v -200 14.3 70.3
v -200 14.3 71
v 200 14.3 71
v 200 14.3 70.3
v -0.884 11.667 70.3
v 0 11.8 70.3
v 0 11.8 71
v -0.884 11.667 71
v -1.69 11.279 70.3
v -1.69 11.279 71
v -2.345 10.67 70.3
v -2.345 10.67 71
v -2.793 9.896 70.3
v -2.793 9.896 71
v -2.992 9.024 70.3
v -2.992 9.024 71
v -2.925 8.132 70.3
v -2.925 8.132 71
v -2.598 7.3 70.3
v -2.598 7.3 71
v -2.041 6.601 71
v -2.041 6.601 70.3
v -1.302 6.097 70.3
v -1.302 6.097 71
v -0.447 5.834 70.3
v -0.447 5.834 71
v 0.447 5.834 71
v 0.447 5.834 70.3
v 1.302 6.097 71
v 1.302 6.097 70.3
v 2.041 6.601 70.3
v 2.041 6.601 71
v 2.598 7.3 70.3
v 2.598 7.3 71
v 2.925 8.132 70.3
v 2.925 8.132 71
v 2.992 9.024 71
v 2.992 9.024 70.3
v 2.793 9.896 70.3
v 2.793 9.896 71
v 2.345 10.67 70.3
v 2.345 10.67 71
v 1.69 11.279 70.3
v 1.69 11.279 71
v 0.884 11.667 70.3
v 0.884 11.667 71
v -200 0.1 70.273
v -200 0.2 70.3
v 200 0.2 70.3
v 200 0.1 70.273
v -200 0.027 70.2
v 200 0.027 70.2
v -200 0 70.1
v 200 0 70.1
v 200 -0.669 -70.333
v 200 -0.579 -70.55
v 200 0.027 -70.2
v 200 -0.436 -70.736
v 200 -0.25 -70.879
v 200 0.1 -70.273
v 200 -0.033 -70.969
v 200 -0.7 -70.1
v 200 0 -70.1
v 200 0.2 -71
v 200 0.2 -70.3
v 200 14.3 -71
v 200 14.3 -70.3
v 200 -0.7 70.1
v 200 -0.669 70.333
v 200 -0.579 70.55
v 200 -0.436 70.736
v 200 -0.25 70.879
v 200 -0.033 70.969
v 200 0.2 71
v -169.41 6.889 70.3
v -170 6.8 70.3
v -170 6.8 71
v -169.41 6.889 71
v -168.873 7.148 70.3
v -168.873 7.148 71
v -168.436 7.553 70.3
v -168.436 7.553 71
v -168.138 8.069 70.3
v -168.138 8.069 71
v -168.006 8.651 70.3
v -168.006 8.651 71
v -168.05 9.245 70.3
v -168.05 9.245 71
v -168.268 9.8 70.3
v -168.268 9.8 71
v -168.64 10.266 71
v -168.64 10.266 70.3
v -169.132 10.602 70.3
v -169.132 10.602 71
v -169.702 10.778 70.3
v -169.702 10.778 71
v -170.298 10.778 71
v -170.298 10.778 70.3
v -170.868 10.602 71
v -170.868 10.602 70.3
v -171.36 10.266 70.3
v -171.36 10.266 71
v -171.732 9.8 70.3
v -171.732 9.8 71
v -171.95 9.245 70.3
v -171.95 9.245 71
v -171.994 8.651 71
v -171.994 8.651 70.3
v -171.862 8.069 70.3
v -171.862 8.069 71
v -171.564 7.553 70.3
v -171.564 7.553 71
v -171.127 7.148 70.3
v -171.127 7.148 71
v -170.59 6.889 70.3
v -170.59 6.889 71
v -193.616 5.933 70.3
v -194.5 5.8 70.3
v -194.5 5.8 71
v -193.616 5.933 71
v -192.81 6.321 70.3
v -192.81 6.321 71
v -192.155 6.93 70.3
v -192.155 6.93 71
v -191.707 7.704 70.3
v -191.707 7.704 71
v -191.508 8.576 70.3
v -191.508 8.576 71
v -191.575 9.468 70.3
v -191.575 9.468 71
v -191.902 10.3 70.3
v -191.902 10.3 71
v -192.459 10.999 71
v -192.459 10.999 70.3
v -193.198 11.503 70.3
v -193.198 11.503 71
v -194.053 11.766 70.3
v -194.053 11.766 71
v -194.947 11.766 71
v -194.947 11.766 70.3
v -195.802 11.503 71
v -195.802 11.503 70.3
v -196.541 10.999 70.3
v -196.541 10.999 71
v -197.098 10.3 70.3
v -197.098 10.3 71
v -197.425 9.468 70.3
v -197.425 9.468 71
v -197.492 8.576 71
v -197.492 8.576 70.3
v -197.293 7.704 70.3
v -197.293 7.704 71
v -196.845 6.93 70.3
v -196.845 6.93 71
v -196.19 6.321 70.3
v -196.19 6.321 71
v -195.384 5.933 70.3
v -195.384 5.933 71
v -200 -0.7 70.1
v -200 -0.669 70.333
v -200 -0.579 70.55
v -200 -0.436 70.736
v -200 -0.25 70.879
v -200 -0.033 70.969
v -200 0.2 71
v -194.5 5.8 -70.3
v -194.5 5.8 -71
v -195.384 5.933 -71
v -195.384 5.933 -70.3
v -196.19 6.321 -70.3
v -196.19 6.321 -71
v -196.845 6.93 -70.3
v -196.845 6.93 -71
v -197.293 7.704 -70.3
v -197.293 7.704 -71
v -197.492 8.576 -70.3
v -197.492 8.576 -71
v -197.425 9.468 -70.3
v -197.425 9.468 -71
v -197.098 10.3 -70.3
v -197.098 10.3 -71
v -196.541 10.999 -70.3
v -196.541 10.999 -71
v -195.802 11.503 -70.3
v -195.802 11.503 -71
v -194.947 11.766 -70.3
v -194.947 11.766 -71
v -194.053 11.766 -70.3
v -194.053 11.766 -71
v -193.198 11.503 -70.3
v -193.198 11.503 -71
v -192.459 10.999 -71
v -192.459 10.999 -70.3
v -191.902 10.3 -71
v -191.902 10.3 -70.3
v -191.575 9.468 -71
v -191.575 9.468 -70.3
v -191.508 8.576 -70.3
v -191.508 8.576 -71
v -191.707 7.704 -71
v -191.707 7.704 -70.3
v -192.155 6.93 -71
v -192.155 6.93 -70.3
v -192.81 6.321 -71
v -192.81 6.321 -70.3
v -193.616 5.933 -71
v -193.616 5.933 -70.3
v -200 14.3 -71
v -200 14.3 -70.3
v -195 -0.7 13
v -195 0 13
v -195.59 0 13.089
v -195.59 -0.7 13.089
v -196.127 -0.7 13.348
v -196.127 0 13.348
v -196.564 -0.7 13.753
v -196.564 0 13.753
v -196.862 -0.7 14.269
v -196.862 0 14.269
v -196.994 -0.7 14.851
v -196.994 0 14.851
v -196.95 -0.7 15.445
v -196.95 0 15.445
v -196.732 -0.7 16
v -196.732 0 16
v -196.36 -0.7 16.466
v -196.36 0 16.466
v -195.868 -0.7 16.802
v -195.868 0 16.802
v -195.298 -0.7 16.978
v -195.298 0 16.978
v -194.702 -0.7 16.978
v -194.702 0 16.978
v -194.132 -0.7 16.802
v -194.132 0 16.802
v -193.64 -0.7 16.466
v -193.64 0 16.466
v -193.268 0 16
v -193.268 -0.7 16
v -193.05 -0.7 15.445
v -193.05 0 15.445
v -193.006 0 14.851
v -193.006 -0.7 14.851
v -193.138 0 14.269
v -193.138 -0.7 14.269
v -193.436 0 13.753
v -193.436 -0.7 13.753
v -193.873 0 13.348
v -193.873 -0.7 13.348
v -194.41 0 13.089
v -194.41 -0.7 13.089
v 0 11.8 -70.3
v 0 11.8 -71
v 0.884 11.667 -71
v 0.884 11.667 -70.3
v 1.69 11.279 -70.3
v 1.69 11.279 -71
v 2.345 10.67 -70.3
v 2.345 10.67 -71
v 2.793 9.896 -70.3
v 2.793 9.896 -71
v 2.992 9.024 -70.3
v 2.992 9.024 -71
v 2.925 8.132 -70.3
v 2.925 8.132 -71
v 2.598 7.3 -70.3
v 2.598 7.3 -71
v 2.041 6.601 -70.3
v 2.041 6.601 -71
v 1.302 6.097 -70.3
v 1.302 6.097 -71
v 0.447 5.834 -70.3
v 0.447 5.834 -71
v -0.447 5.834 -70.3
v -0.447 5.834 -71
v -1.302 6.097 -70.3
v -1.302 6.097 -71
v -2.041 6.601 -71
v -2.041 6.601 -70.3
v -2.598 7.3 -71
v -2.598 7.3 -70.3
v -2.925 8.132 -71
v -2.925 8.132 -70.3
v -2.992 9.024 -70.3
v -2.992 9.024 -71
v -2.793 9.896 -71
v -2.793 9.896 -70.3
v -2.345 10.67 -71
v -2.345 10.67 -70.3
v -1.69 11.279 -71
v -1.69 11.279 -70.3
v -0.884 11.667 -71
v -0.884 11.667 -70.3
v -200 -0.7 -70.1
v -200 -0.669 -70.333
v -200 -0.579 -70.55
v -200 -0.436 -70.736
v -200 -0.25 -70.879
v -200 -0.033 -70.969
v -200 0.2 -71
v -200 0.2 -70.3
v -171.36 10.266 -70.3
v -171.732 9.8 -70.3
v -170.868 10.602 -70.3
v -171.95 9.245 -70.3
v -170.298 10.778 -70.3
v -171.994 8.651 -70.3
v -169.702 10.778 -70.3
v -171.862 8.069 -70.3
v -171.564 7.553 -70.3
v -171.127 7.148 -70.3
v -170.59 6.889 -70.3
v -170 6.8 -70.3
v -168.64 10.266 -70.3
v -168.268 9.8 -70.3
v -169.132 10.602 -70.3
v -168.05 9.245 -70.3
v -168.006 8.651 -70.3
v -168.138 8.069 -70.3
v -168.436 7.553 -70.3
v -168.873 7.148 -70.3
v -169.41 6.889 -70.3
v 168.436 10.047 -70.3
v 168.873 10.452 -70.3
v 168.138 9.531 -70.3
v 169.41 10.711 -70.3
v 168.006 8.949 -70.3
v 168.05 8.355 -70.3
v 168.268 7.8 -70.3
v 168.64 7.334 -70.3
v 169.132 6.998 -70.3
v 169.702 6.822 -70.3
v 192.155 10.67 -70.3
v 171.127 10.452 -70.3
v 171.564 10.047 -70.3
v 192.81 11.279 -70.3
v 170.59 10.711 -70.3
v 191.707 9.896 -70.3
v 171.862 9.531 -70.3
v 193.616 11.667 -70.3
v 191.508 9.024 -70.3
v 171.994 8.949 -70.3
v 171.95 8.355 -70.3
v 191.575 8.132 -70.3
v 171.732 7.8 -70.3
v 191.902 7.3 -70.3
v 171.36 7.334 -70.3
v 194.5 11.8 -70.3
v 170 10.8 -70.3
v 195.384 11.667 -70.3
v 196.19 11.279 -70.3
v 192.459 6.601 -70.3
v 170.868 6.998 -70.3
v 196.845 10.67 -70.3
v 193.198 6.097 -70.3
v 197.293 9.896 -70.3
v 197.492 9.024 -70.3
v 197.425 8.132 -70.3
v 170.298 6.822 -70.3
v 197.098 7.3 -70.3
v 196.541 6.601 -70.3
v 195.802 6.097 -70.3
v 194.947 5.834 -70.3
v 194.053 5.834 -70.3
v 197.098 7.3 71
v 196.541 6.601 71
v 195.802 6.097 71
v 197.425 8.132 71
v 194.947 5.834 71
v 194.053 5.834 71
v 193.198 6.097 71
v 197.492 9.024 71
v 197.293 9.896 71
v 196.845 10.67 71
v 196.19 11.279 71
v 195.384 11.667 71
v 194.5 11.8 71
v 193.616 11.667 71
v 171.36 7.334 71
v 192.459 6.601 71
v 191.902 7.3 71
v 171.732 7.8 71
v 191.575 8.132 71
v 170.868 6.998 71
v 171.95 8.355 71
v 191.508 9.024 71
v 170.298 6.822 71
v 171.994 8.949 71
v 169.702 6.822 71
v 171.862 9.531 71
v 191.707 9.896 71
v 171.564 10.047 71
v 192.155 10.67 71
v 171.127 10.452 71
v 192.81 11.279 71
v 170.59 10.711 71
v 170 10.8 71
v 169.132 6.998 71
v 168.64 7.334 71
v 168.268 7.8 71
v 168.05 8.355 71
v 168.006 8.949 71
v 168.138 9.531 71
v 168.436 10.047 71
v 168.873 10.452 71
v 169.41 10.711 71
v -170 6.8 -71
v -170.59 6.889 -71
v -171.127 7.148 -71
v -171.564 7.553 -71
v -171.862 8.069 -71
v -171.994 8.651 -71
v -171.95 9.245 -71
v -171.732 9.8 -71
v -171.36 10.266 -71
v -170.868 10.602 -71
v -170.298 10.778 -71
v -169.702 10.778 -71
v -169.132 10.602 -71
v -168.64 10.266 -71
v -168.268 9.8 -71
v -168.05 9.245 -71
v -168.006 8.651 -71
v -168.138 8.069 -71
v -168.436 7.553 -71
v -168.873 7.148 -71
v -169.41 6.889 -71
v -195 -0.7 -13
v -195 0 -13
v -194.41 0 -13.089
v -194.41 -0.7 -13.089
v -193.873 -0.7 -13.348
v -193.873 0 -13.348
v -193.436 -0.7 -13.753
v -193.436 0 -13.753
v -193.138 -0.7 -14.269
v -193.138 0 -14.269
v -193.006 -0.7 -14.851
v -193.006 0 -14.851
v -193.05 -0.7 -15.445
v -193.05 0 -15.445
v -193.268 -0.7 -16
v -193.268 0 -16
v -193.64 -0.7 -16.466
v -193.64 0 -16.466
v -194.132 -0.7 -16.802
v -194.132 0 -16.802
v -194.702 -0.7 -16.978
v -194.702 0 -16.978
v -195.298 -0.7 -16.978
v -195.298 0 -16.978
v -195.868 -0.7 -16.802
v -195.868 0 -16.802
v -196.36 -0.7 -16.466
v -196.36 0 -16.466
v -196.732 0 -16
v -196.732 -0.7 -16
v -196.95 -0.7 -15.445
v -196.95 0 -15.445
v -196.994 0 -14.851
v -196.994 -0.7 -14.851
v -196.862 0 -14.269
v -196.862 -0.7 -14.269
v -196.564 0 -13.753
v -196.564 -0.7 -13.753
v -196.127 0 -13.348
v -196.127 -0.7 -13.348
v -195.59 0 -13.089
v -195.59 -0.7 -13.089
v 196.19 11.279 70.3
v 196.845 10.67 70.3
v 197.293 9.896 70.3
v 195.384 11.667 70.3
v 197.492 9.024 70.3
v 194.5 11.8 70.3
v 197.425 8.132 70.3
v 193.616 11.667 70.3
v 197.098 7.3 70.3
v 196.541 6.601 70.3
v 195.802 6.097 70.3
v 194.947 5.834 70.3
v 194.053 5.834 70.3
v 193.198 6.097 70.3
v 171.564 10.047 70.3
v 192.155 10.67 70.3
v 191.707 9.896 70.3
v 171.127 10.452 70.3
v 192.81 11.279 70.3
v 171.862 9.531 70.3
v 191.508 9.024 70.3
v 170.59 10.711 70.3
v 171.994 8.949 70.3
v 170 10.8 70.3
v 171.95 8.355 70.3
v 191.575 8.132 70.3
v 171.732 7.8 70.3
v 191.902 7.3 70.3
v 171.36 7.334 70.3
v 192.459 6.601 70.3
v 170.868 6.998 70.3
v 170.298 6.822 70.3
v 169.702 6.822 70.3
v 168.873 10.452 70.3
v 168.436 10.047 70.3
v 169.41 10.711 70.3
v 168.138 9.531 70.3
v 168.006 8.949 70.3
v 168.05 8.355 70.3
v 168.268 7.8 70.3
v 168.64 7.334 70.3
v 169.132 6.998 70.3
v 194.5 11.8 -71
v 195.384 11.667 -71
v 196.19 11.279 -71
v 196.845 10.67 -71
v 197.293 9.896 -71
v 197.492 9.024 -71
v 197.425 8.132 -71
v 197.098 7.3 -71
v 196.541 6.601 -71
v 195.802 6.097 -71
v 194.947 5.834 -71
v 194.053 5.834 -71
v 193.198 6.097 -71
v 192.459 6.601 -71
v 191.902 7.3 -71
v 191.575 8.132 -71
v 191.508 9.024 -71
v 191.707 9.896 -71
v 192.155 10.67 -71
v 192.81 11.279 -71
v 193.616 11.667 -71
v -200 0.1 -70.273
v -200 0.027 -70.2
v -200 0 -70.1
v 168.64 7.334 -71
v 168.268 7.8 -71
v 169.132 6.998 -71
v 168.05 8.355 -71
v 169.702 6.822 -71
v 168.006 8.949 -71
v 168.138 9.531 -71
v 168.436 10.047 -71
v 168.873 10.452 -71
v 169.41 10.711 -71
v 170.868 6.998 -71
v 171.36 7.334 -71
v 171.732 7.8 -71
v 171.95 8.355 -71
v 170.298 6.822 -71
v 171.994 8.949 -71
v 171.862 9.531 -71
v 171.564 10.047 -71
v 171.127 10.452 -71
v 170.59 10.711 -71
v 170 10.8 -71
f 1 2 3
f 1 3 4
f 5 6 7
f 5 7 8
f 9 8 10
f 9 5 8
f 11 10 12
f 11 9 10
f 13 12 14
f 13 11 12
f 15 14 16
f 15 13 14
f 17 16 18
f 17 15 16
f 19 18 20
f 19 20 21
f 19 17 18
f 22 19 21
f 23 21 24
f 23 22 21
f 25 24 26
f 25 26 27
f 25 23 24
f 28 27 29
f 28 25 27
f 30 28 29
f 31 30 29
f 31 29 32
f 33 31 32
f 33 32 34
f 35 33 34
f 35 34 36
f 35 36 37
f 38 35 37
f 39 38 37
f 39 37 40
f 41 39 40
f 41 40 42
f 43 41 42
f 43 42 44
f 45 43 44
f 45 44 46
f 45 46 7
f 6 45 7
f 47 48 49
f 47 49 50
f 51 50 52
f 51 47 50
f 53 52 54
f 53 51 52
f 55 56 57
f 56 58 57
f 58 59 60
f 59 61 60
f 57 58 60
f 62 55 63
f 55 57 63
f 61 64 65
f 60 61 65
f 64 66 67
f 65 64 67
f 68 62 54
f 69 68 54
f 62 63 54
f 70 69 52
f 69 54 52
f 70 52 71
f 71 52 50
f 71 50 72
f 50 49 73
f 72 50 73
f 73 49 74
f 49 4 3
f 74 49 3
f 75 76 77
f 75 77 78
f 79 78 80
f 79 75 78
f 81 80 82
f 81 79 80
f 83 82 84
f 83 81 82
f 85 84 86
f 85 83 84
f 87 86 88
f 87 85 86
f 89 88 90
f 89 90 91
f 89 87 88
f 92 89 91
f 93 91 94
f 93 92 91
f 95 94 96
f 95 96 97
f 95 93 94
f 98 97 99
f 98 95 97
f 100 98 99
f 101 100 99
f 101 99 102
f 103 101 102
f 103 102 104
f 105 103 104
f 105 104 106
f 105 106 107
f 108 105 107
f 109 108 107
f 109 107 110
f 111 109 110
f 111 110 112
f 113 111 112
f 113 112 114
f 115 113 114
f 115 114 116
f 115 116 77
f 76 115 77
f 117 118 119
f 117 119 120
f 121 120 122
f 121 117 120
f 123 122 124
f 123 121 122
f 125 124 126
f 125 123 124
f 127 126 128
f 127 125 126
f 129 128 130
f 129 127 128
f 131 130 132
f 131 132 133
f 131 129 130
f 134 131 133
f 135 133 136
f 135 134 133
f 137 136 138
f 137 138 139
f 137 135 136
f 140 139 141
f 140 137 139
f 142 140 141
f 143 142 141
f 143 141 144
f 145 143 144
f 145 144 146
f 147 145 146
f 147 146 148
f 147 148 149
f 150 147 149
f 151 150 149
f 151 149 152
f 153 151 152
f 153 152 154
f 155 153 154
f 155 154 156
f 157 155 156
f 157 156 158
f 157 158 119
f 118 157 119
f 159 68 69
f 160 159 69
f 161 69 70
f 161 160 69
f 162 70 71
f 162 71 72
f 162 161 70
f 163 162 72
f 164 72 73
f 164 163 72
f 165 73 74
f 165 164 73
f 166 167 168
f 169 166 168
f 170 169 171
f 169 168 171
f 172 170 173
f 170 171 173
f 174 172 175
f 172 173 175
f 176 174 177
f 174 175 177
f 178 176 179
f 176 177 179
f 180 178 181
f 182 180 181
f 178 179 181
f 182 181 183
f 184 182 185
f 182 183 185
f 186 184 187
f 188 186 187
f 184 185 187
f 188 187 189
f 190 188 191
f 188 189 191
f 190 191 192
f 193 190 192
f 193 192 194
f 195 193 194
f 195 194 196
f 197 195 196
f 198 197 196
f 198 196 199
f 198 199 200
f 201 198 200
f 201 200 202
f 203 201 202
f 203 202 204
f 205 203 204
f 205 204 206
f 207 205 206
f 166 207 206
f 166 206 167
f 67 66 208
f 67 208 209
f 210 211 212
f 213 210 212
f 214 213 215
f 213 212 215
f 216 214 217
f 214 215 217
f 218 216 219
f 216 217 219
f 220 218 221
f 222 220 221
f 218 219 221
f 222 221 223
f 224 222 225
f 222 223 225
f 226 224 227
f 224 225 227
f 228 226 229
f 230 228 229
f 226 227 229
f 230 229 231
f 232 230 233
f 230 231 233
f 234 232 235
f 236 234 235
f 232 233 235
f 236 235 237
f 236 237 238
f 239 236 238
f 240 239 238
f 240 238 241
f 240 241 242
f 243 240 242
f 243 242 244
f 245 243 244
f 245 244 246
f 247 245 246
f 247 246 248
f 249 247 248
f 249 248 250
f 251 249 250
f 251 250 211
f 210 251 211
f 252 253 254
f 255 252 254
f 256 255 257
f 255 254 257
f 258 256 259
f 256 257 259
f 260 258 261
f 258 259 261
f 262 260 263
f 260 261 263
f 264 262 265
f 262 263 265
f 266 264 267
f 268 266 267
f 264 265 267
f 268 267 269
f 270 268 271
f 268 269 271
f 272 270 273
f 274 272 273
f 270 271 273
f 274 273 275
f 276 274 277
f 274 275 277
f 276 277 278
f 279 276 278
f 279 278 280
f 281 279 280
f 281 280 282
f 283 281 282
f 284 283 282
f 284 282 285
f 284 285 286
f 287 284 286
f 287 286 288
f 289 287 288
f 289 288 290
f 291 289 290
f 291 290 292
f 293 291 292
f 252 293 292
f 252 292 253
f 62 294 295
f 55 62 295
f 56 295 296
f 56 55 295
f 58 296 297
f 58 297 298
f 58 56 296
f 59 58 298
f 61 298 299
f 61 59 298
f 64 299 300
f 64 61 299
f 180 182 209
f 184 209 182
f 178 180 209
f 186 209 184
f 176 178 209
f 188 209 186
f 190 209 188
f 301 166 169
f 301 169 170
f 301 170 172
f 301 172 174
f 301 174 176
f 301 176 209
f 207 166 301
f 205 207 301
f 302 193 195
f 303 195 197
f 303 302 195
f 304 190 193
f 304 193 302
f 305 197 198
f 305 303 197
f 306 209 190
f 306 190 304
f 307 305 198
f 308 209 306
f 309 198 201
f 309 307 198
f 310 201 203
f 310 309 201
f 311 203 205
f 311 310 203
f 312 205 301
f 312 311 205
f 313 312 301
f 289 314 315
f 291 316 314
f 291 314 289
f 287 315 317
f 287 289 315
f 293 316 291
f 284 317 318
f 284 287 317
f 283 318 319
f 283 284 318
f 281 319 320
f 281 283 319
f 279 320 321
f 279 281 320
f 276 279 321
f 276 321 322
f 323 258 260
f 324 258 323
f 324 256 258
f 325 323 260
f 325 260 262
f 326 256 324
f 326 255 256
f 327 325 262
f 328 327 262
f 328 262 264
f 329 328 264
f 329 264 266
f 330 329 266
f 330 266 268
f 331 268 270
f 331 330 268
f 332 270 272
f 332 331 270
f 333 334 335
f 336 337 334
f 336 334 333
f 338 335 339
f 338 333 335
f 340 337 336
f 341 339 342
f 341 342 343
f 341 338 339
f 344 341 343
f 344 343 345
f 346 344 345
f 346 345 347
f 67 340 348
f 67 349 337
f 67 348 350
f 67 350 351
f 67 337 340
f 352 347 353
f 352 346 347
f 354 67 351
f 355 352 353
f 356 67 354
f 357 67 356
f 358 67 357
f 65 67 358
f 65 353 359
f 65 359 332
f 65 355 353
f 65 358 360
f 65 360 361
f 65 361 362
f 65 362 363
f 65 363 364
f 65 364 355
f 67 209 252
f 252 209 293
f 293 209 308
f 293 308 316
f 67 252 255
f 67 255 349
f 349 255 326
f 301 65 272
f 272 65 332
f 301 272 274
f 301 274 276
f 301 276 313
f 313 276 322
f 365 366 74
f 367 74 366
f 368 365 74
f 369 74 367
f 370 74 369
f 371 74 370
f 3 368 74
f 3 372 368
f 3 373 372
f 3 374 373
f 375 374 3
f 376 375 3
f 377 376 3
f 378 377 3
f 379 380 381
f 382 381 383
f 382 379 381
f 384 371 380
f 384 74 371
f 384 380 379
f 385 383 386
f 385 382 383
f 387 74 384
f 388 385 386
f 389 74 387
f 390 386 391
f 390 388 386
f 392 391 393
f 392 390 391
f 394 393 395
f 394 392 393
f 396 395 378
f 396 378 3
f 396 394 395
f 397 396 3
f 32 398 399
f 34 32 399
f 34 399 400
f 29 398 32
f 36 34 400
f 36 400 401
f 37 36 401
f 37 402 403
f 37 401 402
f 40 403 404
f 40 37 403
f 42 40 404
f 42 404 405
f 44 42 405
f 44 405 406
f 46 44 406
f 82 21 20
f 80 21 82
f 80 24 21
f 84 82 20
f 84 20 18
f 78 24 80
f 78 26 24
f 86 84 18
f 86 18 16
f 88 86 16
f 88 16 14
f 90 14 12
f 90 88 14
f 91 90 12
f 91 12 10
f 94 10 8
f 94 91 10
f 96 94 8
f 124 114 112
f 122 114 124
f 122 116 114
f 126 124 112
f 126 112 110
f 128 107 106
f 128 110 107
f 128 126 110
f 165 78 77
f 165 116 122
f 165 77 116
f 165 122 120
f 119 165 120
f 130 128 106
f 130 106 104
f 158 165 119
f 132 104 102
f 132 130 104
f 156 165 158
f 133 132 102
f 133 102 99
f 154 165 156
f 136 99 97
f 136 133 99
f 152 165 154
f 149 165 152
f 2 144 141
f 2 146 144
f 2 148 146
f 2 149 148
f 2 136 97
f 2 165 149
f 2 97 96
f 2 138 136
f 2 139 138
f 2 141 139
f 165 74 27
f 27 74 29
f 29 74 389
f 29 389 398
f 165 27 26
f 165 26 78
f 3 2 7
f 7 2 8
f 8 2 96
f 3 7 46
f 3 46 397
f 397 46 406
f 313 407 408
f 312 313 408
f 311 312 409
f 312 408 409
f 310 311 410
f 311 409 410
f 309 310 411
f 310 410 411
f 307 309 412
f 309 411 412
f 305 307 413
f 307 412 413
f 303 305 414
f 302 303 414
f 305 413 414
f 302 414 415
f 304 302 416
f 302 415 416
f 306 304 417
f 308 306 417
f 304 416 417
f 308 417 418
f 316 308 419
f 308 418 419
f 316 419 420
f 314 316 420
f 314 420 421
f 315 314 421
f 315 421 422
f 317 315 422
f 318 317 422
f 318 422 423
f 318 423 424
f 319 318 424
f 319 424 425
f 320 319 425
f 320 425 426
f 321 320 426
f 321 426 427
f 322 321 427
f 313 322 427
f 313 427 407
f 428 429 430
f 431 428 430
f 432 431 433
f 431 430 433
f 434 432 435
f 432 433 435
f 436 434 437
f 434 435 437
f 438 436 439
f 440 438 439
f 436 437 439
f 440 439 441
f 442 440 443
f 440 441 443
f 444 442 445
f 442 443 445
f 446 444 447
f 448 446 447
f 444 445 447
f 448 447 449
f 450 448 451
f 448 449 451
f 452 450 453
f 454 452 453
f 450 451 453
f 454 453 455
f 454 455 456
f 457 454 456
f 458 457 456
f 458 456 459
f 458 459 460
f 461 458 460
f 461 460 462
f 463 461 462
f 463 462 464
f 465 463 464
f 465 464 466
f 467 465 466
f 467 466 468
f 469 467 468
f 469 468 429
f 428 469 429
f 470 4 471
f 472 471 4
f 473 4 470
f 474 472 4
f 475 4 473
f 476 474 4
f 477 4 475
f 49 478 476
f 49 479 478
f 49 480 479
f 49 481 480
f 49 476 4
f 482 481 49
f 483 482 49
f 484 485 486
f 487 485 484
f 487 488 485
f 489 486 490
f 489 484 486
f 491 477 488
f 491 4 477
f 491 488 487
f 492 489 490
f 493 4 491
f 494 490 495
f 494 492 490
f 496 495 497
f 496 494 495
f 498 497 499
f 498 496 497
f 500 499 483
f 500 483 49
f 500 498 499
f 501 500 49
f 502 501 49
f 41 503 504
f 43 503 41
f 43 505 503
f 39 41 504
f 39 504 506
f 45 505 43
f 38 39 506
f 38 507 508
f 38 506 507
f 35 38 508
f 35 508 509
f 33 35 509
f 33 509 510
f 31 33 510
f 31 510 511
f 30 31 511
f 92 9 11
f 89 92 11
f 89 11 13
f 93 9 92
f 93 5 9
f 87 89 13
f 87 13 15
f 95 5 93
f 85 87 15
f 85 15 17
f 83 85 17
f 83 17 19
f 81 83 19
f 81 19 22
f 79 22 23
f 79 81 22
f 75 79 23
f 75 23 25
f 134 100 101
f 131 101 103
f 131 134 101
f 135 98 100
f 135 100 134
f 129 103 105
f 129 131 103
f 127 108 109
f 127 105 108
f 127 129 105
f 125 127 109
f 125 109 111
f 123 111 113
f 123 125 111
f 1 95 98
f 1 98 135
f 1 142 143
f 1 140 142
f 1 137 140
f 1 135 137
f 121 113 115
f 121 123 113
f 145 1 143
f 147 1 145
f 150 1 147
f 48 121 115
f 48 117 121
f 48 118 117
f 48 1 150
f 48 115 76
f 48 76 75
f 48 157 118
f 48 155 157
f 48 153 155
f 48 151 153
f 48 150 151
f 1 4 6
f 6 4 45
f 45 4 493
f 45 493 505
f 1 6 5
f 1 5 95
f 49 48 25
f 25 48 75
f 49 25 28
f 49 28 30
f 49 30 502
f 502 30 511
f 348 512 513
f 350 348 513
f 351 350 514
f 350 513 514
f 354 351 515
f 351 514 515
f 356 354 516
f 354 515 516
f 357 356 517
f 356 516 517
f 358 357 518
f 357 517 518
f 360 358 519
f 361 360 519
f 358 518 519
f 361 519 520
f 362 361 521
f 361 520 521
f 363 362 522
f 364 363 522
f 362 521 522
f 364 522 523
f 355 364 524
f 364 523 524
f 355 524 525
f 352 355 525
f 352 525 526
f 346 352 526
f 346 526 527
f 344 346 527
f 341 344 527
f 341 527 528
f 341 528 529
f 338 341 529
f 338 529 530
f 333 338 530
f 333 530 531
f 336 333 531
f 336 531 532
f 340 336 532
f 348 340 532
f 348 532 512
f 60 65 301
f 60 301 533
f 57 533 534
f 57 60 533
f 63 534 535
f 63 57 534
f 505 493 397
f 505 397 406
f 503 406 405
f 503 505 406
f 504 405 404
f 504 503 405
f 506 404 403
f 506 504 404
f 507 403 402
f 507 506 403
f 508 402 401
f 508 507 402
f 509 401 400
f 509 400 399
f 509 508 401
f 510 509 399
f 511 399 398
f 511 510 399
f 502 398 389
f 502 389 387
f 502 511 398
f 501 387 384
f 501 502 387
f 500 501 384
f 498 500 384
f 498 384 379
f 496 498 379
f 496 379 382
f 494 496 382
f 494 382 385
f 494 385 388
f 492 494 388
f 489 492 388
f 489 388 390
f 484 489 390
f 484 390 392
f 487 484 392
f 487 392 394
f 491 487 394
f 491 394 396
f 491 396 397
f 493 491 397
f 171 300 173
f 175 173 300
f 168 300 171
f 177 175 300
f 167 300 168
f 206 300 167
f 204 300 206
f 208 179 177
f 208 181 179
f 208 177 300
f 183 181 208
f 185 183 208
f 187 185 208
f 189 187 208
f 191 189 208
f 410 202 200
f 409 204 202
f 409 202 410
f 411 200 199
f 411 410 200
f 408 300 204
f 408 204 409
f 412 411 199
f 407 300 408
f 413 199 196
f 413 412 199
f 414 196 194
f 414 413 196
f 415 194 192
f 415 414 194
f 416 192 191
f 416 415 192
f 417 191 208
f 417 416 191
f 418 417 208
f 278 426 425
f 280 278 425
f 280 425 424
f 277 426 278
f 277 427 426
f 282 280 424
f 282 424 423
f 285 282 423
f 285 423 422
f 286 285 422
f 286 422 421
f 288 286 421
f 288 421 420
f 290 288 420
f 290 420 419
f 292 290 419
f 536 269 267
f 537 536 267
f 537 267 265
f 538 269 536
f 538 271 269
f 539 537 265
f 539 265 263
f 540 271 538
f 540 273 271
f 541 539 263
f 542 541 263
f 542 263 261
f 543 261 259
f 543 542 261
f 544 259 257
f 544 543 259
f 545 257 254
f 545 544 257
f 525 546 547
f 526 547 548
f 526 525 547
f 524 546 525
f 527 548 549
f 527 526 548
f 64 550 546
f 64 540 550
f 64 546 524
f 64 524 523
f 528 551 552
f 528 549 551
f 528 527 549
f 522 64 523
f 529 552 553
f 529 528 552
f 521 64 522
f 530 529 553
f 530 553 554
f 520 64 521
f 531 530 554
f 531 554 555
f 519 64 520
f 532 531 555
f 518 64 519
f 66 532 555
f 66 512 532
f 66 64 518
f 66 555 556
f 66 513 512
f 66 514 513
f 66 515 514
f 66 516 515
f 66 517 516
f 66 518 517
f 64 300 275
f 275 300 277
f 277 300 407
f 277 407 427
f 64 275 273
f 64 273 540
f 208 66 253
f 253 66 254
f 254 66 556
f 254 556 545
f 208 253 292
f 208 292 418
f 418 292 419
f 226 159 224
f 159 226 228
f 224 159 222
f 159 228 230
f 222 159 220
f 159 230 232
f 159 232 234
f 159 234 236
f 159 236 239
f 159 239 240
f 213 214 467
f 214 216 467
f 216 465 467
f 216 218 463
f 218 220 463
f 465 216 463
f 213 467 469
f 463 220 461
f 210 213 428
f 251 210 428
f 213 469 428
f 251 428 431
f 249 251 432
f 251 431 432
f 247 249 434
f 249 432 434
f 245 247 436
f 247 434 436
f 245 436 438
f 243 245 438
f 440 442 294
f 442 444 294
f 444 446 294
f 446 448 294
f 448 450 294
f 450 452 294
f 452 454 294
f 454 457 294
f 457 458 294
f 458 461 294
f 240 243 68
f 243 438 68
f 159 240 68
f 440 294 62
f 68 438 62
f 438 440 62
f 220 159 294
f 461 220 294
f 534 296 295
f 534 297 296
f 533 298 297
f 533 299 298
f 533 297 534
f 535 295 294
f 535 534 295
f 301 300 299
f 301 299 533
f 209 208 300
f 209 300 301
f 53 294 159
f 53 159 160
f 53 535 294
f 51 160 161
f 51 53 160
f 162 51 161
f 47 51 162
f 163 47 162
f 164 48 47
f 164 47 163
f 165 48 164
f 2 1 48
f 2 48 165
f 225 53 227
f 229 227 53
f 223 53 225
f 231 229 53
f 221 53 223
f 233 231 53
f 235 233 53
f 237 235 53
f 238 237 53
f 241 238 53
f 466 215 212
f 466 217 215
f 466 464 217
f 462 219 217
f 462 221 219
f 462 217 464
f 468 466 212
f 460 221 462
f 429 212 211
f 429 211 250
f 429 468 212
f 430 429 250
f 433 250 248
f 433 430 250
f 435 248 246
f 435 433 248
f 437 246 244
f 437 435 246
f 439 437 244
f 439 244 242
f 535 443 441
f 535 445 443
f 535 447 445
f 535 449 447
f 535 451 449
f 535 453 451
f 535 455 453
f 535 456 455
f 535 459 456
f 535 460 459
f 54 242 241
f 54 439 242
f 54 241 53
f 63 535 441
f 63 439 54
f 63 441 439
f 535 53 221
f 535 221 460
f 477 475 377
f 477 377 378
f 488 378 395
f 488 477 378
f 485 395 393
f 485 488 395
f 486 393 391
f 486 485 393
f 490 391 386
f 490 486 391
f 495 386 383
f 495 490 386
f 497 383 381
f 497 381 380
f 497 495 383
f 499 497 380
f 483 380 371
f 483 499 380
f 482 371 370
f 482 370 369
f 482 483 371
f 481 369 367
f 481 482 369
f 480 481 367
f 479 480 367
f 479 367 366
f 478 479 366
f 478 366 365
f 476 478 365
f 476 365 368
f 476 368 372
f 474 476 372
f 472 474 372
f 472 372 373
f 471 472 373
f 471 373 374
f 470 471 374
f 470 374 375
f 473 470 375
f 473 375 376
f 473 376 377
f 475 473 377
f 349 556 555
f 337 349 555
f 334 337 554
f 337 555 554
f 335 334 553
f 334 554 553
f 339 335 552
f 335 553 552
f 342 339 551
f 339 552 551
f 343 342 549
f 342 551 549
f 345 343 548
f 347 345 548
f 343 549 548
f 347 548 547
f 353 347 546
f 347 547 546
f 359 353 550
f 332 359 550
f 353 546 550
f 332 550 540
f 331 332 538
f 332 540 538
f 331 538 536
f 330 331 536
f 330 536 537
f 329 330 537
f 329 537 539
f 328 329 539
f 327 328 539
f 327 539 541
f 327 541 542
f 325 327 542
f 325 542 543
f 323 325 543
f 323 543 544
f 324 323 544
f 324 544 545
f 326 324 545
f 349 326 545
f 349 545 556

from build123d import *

# Parameters (mm, degrees)
SKETCH_1_W                         = 400
SKETCH_1_H                         = 142
SM_BASE_FLANGE_1_DEPTH             = 0.7
SM_EDGE_FLANGE_1_STRIP_W           = 3.2
SM_EDGE_FLANGE_1_STRIP_H           = 0.7
SM_EDGE_FLANGE_1_STRIP_CUT_DEPTH   = 400
SM_EDGE_FLANGE_1_STRIP_2_W         = 3.2
SM_EDGE_FLANGE_1_STRIP_2_H         = 0.7
SM_EDGE_FLANGE_1_STRIP_CUT_2_DEPTH = 400
SM_EDGE_FLANGE_1_DEPTH             = 400
SM_EDGE_FLANGE_1_BEND_DEPTH        = 400
SKETCH_17_R                        = 3
CUT_EXTRUDE_1_DEPTH                = 10
CUT_EXTRUDE_START                  = -10
SKETCH_18_R                        = 3
CUT_EXTRUDE_2_DEPTH                = 10
SKETCH_19_R                        = 2
CUT_EXTRUDE_3_DEPTH                = 10
SKETCH_20_R                        = 2
CUT_EXTRUDE_4_DEPTH                = 10
SKETCH_21_R                        = 2
CUT_EXTRUDE_5_DEPTH                = 10


# Sheet-metal steps are written as plain solids
with BuildPart() as part:
    # 草图1 → 基体-法兰1 (new body)
    with BuildSketch(Plane(origin=(0, 0, 0), x_dir=(1, 0, 0), z_dir=(0, 1, 0))):
        Rectangle(SKETCH_1_W, SKETCH_1_H)
    extrude(amount=-SM_BASE_FLANGE_1_DEPTH)

    # 边线-法兰1 strip (across the edge) → 边线-法兰1 strip cut (cut)
    with BuildSketch(Plane(origin=(200, 0, -71), x_dir=(0, 0, 1), z_dir=(-1, 0, 0))):
        with Locations((-0.7, -0.35)):
            Rectangle(SM_EDGE_FLANGE_1_STRIP_W, SM_EDGE_FLANGE_1_STRIP_H)
    extrude(amount=SM_EDGE_FLANGE_1_STRIP_CUT_DEPTH, mode=Mode.SUBTRACT)

    # 边线-法兰1 strip 2 (across the edge) → 边线-法兰1 strip cut 2 (cut)
    with BuildSketch(Plane(origin=(-200, 0, 71), x_dir=(0, 0, -1), z_dir=(1, 0, 0))):
        with Locations((-0.7, -0.35)):
            Rectangle(SM_EDGE_FLANGE_1_STRIP_2_W, SM_EDGE_FLANGE_1_STRIP_2_H)
    extrude(amount=SM_EDGE_FLANGE_1_STRIP_CUT_2_DEPTH, mode=Mode.SUBTRACT)

    # 边线-法兰1 section (across the edge) → 边线-法兰1 (add)
    with BuildSketch(Plane(origin=(200, 0, -71), x_dir=(0, 0, 1), z_dir=(-1, 0, 0))):
        with BuildLine():
            Line((0, 0.2), (0, 14.3))
            Line((0, 14.3), (0.7, 14.3))
            Line((0.7, 14.3), (0.7, 0.2))
            ThreePointArc((0.7, 0.2), (0.758578644, 0.058578644), (0.9, 0))
            Line((0.9, 0), (0.9, -0.7))
            ThreePointArc((0.9, -0.7), (0.263603897, -0.436396103), (0, 0.2))
        make_face()
    extrude(amount=SM_EDGE_FLANGE_1_DEPTH)

    # 边线-法兰1 section 2 (across the edge) → 边线-法兰1 bend (add)
    with BuildSketch(Plane(origin=(-200, 0, 71), x_dir=(0, 0, -1), z_dir=(1, 0, 0))):
        with BuildLine():
            Line((0, 0.2), (0, 14.3))
            Line((0, 14.3), (0.7, 14.3))
            Line((0.7, 14.3), (0.7, 0.2))
            ThreePointArc((0.7, 0.2), (0.758578644, 0.058578644), (0.9, 0))
            Line((0.9, 0), (0.9, -0.7))
            ThreePointArc((0.9, -0.7), (0.263603897, -0.436396103), (0, 0.2))
        make_face()
    extrude(amount=SM_EDGE_FLANGE_1_BEND_DEPTH)

    # 草图17 → 切除-拉伸1 (cut)
    with BuildSketch(Plane(origin=(0, 0, -71), x_dir=(-1, 0, 0), z_dir=(0, 0, -1))):
        with Locations(Location((-194.5, 8.8, 0), (0, 0, 90))):
            Circle(SKETCH_17_R)
        with Locations(Location((0, 8.8, 0), (0, 0, 90))):
            Circle(SKETCH_17_R)
        with Locations(Location((194.5, 8.8, 0), (0, 0, 270))):
            Circle(SKETCH_17_R)
    extrude(amount=-CUT_EXTRUDE_1_DEPTH, mode=Mode.SUBTRACT)

    # 草图18 → 切除-拉伸2 (cut)
    with BuildSketch(Plane.XY.offset(71).offset(CUT_EXTRUDE_START)):
        with Locations(Location((-194.5, 8.8, 0), (0, 0, 270))):
            Circle(SKETCH_18_R)
        with Locations(Location((0, 8.8, 0), (0, 0, 90))):
            Circle(SKETCH_18_R)
        with Locations(Location((194.5, 8.8, 0), (0, 0, 90))):
            Circle(SKETCH_18_R)
    extrude(amount=CUT_EXTRUDE_2_DEPTH, mode=Mode.SUBTRACT)

    # 草图19 → 切除-拉伸3 (cut)
    with BuildSketch(Plane(origin=(0, 0, -71), x_dir=(-1, 0, 0), z_dir=(0, 0, -1))):
        with Locations(Location((-170, 8.8, 0), (0, 0, 90))):
            Circle(SKETCH_19_R)
        with Locations(Location((170, 8.8, 0), (0, 0, 270))):
            Circle(SKETCH_19_R)
    extrude(amount=-CUT_EXTRUDE_3_DEPTH, mode=Mode.SUBTRACT)

    # 草图20 → 切除-拉伸4 (cut)
    with BuildSketch(Plane.XY.offset(71).offset(CUT_EXTRUDE_START)):
        with Locations(Location((-170, 8.8, 0), (0, 0, 270))):
            Circle(SKETCH_20_R)
        with Locations(Location((170, 8.8, 0), (0, 0, 90))):
            Circle(SKETCH_20_R)
    extrude(amount=CUT_EXTRUDE_4_DEPTH, mode=Mode.SUBTRACT)

    # 草图21 → 切除-拉伸5 (cut)
    with BuildSketch(Plane(origin=(0, 0, 0), x_dir=(1, 0, 0), z_dir=(0, 1, 0))):
        with Locations(Location((-195, 15, 0), (0, 0, 270))):
            Circle(SKETCH_21_R)
        with Locations(Location((-195, -15, 0), (0, 0, 90))):
            Circle(SKETCH_21_R)
    extrude(amount=-CUT_EXTRUDE_5_DEPTH, mode=Mode.SUBTRACT)


solid = part.part
